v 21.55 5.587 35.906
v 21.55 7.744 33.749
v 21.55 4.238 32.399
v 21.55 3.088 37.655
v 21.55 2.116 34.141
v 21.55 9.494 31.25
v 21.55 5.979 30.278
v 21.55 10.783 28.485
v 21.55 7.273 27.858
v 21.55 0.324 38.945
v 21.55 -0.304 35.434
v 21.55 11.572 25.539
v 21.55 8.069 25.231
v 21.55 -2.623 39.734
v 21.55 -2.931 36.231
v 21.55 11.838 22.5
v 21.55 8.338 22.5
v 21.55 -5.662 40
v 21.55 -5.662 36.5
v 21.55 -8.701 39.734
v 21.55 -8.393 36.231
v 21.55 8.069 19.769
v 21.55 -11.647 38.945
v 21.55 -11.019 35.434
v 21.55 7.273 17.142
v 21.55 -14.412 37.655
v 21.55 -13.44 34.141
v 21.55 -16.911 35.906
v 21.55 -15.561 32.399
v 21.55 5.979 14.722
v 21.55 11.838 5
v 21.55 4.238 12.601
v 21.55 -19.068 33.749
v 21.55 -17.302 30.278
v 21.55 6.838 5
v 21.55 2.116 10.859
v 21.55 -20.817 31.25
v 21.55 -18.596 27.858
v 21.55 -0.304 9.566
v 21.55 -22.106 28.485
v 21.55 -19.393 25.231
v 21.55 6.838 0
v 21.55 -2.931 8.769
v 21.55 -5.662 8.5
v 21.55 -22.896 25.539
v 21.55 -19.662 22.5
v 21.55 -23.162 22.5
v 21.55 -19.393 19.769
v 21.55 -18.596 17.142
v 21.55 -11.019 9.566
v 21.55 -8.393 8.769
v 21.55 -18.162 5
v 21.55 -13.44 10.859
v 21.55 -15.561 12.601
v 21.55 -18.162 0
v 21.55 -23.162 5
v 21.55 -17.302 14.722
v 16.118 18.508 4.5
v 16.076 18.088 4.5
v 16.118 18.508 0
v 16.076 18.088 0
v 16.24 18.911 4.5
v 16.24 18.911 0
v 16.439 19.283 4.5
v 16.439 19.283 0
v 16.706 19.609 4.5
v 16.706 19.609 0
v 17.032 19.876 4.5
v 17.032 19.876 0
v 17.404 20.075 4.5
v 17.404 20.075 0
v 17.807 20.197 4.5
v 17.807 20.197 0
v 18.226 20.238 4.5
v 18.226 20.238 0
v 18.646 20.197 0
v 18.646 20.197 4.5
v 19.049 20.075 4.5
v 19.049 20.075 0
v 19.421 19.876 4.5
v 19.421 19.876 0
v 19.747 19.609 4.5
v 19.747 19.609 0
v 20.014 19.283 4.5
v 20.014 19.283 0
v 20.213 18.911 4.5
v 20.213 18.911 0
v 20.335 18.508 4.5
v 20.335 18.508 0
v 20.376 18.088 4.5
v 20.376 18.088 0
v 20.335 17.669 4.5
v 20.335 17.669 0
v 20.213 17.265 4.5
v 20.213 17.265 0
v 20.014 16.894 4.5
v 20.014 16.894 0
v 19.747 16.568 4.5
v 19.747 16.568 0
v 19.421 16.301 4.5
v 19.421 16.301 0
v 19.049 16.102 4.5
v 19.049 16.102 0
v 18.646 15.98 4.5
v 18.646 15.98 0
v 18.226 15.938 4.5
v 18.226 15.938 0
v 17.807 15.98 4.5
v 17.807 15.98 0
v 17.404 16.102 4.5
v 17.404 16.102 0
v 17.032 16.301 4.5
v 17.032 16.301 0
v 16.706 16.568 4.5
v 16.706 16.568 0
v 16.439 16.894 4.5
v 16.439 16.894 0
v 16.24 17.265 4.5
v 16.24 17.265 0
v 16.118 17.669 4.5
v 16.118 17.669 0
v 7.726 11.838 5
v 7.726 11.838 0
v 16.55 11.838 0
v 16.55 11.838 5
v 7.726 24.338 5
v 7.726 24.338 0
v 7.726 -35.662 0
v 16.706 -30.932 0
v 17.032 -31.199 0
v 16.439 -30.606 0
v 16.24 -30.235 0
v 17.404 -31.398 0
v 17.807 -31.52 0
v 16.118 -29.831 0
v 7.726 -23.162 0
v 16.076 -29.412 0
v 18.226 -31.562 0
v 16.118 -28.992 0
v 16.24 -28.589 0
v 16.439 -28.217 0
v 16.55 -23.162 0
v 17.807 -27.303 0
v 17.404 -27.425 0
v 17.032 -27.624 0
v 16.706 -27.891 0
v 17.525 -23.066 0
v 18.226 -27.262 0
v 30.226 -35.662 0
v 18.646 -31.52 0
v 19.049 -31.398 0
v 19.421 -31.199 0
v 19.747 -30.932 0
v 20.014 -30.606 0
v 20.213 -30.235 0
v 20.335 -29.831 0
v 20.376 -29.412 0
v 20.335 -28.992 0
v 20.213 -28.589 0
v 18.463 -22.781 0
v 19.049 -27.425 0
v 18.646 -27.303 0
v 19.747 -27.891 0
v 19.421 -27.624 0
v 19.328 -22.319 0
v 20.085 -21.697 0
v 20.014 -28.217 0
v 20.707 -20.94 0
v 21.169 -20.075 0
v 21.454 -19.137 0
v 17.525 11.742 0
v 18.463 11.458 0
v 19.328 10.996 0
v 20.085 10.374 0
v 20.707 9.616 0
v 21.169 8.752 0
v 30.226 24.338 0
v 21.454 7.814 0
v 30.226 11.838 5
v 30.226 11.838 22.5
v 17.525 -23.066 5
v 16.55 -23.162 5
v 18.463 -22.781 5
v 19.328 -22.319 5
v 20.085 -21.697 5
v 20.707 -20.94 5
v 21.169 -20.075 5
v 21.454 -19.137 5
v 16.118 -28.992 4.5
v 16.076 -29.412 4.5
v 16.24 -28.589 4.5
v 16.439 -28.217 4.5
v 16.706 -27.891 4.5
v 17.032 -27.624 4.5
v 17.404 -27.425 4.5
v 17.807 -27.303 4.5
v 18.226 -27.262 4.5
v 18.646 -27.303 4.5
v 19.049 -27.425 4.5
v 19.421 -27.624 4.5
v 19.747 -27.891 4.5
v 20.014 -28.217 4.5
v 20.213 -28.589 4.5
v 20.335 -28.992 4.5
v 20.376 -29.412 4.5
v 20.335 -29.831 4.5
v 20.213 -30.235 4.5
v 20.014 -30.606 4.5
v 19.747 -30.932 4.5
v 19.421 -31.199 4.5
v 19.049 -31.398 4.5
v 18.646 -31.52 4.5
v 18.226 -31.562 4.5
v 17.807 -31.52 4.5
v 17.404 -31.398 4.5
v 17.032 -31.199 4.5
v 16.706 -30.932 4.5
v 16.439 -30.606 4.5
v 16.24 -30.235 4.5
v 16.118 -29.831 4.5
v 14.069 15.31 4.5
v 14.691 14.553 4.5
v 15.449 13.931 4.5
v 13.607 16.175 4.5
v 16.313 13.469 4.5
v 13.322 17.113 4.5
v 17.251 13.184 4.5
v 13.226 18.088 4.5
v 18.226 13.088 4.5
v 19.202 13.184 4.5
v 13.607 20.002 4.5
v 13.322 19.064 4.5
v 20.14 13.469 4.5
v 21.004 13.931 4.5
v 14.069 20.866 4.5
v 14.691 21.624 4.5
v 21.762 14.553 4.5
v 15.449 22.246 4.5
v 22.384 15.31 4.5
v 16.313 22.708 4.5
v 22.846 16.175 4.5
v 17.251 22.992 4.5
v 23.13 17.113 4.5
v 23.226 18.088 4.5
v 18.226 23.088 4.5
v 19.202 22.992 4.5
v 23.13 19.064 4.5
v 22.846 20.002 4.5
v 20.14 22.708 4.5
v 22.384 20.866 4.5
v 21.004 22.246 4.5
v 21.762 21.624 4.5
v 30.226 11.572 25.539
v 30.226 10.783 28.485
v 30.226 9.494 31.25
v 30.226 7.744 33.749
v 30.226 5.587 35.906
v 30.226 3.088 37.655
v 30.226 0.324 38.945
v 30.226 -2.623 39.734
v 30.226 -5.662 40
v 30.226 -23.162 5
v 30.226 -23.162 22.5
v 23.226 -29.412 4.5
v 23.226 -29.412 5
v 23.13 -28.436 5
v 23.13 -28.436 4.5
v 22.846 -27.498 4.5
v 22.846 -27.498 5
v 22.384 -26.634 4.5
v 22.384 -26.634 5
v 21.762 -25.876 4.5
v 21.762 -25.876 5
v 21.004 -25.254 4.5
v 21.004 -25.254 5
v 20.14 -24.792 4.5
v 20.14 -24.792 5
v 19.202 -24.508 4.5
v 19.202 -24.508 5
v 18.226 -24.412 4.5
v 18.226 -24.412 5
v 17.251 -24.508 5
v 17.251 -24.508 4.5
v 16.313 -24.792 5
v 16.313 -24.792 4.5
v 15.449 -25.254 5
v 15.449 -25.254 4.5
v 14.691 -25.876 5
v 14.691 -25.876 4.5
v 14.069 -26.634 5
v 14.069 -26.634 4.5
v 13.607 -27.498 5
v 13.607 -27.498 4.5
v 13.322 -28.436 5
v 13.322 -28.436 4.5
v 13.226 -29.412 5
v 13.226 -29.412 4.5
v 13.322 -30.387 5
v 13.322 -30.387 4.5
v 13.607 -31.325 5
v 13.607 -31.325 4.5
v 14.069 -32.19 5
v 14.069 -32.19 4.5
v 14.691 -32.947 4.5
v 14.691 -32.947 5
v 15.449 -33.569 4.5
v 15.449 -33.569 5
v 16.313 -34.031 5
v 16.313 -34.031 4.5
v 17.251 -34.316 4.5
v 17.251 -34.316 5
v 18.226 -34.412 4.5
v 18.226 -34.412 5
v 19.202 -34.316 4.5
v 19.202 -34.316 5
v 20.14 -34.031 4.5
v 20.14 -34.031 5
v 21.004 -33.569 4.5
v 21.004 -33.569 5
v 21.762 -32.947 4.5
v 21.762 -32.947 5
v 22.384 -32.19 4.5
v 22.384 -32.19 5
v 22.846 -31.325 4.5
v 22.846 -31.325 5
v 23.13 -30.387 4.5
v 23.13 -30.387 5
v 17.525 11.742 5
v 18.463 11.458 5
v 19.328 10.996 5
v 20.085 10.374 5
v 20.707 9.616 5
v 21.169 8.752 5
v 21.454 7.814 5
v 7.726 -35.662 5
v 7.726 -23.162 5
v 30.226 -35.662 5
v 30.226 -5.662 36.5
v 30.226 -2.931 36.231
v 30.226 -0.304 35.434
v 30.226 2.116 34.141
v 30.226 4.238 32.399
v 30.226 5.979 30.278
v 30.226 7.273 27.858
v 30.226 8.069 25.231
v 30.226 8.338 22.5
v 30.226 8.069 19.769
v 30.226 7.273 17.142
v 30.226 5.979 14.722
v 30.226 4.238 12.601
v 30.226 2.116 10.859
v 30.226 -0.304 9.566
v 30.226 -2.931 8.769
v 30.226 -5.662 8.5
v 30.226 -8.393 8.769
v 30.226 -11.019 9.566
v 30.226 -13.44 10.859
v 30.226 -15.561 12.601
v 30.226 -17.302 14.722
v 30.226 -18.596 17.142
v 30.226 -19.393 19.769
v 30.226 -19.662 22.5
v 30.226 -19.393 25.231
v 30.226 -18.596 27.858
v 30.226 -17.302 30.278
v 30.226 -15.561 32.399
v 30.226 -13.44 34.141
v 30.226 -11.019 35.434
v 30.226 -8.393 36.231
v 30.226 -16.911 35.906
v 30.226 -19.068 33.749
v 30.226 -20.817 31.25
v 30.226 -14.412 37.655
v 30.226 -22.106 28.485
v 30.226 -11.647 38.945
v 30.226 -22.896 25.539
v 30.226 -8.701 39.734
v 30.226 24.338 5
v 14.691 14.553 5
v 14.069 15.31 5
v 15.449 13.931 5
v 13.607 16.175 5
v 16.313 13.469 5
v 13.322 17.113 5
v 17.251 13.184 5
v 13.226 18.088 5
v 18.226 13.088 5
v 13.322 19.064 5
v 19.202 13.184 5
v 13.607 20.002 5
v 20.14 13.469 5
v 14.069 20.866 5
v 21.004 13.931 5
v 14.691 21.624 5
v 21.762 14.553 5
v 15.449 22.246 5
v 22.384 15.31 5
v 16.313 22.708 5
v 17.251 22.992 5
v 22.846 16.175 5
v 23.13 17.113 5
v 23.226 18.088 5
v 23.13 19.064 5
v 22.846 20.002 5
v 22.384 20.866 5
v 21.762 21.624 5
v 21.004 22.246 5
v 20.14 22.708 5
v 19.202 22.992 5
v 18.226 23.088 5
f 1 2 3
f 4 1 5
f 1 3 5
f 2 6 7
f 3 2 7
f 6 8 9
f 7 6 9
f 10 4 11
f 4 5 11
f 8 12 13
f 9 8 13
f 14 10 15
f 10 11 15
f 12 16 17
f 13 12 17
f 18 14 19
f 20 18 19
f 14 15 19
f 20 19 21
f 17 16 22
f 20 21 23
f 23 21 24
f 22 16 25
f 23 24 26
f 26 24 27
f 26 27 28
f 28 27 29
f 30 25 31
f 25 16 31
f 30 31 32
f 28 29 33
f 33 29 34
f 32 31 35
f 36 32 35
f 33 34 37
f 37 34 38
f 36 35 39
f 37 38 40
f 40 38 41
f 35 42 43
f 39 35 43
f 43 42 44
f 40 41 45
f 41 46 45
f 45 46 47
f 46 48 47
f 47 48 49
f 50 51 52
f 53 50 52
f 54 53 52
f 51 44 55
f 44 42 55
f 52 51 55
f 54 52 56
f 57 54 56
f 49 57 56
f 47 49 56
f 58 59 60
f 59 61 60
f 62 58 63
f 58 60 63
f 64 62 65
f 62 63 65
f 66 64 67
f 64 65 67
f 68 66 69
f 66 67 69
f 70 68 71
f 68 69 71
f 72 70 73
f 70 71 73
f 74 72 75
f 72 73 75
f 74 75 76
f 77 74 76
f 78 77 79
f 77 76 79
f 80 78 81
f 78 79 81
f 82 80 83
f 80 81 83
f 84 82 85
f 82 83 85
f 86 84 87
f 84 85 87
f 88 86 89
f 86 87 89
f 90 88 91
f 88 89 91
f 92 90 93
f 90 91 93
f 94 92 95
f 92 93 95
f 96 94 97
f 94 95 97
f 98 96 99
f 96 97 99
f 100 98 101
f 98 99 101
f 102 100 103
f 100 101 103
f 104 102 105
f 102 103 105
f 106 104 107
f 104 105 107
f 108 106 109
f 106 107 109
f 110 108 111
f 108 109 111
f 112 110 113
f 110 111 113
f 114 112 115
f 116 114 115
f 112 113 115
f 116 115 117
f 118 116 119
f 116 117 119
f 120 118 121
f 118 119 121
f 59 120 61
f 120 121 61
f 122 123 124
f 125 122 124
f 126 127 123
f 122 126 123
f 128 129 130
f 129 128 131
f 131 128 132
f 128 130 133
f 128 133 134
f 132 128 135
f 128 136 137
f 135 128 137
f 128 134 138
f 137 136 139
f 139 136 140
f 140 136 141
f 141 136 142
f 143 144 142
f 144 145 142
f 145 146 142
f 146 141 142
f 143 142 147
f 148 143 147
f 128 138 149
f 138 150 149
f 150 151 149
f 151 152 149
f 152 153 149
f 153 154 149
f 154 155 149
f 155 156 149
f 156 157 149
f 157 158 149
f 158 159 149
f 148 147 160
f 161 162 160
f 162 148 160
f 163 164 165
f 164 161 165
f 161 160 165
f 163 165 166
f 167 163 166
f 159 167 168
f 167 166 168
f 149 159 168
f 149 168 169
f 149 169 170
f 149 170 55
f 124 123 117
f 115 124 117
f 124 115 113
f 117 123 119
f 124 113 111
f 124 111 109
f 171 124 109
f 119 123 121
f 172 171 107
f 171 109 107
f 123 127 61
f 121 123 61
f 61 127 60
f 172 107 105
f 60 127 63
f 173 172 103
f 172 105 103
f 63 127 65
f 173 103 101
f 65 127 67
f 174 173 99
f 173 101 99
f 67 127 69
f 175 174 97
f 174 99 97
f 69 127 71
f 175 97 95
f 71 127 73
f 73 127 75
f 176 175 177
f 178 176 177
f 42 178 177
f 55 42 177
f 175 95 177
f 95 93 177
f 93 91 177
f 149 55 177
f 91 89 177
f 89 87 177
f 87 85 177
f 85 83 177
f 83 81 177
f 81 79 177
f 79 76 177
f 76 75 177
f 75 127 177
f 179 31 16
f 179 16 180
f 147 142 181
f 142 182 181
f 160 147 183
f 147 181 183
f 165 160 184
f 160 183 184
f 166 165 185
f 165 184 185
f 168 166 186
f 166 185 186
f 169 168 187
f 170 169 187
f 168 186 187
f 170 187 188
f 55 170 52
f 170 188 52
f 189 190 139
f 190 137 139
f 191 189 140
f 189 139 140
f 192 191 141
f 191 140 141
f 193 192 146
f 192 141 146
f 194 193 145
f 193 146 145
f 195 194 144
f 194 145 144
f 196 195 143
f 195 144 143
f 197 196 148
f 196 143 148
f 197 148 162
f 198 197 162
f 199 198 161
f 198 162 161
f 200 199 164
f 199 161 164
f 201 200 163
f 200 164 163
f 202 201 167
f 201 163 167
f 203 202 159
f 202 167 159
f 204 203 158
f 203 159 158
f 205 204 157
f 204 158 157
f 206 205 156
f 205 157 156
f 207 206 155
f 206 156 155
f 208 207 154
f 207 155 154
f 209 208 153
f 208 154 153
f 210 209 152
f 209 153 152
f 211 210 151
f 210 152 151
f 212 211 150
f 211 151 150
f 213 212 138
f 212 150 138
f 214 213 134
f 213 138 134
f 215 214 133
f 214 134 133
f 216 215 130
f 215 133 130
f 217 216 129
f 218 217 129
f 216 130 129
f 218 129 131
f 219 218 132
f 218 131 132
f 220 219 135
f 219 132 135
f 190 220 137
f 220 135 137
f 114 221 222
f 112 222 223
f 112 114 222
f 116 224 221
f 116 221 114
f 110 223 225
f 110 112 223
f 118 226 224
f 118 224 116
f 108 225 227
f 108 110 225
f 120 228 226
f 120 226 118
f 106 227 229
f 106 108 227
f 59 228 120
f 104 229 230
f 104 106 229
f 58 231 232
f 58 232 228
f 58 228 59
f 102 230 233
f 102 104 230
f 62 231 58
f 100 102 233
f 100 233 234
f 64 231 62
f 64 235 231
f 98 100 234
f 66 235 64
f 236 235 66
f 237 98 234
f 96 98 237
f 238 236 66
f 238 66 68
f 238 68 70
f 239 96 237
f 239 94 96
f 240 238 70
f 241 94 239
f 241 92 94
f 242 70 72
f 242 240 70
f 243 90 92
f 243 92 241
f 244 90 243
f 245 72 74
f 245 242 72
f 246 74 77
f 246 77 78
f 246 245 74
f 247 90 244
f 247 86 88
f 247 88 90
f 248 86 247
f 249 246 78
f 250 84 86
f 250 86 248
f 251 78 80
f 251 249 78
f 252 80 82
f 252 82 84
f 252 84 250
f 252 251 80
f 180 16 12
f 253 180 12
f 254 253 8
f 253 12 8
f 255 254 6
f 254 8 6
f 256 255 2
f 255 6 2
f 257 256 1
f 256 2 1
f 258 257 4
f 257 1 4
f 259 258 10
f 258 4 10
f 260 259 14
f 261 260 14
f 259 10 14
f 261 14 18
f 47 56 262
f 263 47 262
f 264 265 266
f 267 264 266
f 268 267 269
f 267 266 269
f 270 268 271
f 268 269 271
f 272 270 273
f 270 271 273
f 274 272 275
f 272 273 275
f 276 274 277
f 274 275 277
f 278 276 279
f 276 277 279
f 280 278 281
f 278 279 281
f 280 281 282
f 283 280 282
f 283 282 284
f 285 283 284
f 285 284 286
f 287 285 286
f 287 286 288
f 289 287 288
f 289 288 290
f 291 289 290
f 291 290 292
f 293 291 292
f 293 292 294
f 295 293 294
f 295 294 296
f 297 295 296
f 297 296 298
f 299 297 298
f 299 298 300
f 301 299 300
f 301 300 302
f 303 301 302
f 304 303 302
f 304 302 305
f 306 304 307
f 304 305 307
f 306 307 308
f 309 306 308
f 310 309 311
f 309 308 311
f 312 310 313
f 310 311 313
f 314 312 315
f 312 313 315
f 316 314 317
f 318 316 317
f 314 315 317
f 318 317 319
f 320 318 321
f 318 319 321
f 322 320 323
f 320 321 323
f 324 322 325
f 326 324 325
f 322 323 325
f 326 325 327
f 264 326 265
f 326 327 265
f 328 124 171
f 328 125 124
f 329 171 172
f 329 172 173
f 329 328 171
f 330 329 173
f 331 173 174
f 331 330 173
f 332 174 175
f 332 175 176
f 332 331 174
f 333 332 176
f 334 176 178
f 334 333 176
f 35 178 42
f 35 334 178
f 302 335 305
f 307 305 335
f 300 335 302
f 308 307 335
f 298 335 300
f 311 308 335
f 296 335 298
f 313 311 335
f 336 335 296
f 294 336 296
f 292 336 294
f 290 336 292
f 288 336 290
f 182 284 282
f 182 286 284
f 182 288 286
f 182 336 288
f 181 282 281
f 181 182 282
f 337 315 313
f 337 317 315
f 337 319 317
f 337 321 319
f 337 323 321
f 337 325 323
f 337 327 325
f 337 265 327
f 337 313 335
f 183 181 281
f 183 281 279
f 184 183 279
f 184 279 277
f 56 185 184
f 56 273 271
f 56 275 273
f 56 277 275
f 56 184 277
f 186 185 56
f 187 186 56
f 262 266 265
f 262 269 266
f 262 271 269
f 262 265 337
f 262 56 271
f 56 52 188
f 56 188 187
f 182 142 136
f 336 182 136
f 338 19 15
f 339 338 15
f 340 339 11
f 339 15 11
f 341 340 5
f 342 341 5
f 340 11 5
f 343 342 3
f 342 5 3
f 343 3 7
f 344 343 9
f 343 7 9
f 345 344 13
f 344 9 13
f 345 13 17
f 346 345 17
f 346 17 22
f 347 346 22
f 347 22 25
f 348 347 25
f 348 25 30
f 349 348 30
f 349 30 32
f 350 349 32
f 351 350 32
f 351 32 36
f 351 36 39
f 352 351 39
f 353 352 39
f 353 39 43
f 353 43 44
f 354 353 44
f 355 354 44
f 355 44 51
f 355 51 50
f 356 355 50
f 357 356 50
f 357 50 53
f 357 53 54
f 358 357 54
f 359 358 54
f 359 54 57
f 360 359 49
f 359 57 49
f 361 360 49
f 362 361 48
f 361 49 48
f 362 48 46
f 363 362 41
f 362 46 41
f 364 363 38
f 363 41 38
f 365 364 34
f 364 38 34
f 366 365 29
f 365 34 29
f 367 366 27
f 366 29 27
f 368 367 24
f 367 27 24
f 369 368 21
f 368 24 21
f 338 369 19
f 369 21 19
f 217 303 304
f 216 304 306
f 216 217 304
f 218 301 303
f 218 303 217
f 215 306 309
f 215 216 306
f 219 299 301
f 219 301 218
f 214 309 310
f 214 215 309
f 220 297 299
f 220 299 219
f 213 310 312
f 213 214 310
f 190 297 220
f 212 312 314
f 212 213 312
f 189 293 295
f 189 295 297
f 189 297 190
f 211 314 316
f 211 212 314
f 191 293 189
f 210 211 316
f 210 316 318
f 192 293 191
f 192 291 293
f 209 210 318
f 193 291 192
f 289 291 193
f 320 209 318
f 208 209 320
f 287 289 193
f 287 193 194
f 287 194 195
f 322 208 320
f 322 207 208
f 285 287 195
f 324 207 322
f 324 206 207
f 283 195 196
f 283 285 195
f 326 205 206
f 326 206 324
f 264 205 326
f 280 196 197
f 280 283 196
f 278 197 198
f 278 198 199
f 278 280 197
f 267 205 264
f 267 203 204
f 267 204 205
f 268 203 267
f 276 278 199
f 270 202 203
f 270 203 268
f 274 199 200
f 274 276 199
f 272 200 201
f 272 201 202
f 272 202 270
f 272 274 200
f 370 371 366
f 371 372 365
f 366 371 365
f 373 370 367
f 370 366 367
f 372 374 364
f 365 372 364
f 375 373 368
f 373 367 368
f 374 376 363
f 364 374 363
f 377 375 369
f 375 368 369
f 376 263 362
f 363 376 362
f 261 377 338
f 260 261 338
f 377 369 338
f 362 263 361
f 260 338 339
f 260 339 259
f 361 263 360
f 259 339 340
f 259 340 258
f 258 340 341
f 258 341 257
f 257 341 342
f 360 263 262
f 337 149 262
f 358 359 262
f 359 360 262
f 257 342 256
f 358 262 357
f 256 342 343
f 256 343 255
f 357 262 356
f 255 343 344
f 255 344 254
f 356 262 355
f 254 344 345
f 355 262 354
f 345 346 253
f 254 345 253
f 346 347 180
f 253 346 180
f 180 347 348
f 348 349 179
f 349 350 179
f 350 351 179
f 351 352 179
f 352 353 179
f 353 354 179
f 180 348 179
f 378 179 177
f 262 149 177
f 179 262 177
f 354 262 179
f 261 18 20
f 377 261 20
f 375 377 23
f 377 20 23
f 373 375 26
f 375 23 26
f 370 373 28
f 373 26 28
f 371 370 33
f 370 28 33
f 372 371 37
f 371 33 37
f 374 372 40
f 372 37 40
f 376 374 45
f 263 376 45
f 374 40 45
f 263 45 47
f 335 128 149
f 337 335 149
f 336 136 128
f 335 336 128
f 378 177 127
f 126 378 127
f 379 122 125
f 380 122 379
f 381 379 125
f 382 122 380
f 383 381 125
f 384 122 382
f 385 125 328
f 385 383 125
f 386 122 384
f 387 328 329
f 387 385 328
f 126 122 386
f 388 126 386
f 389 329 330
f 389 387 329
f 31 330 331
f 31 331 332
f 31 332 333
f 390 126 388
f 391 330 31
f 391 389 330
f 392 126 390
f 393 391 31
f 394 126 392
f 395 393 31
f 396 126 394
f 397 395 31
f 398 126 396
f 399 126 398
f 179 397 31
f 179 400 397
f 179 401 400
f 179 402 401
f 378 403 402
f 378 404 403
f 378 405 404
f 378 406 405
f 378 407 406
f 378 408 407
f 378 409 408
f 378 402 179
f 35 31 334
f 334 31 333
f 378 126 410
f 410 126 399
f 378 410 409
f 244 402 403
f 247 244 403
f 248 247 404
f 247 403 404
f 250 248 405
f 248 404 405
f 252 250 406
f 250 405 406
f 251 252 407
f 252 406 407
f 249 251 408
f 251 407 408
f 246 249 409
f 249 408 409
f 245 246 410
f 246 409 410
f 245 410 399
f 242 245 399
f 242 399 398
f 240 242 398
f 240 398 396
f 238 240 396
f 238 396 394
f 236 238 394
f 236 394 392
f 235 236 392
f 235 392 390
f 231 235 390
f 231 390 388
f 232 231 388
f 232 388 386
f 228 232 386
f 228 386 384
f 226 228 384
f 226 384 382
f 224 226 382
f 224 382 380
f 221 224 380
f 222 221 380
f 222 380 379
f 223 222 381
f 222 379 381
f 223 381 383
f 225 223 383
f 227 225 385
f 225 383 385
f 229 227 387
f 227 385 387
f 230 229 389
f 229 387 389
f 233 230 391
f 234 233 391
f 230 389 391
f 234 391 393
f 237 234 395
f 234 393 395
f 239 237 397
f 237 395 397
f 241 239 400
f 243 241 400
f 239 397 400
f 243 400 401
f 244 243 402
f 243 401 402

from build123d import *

# Parameters (mm, degrees)
EXTRUDE_2_DEPTH                = 5
SKETCH_4_W                     = 8.676470589
SKETCH_4_H                     = 35
SKETCH_4_W_2                   = 8.676470588
EXTRUDE_15_DEPTH               = 35
CUT_EXTRUDE_1_DEPTH            = 45
SKETCH_6_R                     = 14
CUT_EXTRUDE_2_DEPTH            = 45
FILLET_1_R                     = 5
SKETCH_7_R                     = 15
SKETCH_7_R_2                   = 13
EXTRUDE_16_DEPTH               = 1
SPLIT_BODIES_1_SURFACE_1_BACK  = 86
SPLIT_BODIES_1_SURFACE_1_DEPTH = 172
SPLIT_BODIES_1_SURFACE_2_BACK  = 86
SPLIT_BODIES_1_SURFACE_2_DEPTH = 172
HOLE_WIZARD_1_D                = 4.3
HOLE_WIZARD_1_DEPTH            = 5
HOLE_WIZARD_1_CBORE_D          = 10
HOLE_WIZARD_1_CBORE_DEPTH      = 0.5
HOLE_WIZARD_1_TIP              = 1.291850331


with BuildPart() as part:
    # 草图2 → 凸台-拉伸2 (new body)
    with BuildSketch(Plane.XY):
        Polygon((7.726423565, 24.338235294), (-14.773576435, 24.338235294), (-14.773576435, -35.661764706), (7.726423565, -35.661764706), (7.726423565, -23.161764706), (-6.097105846, -23.161764706), (-6.097105846, 11.838235294), (7.726423565, 11.838235294), align=None)
        Polygon((30.226423565, 24.338235294), (7.726423565, 24.338235294), (7.726423565, 11.838235294), (21.549952977, 11.838235294), (21.549952977, -23.161764706), (7.726423565, -23.161764706), (7.726423565, -35.661764706), (30.226423565, -35.661764706), align=None)
    extrude(amount=EXTRUDE_2_DEPTH)

    # 草图4 → 凸台-拉伸15 (add)
    with BuildSketch(Plane.XY.offset(5)):
        with Locations((-10.435341141, -5.661764706)):
            Rectangle(SKETCH_4_W, SKETCH_4_H)
        with Locations((25.888188271, -5.661764706)):
            Rectangle(SKETCH_4_W_2, SKETCH_4_H)
    extrude(amount=EXTRUDE_15_DEPTH)

    # 草图5 → 切除-拉伸1 (cut)
    with BuildSketch(Plane.ZY.offset(14.773576435)):
        with BuildLine():
            Line((40, -23.161764706), (40, -5.661764706))
            ThreePointArc((40, -5.661764706), (34.874368671, -18.036133377), (22.5, -23.161764706))
            Line((22.5, -23.161764706), (40, -23.161764706))
        make_face()
        with BuildLine():
            ThreePointArc((22.5, 11.838235294), (34.874368671, 6.712603965), (40, -5.661764706))
            Line((40, -5.661764706), (40, 11.838235294))
            Line((40, 11.838235294), (22.5, 11.838235294))
        make_face()
    extrude(amount=-CUT_EXTRUDE_1_DEPTH, mode=Mode.SUBTRACT)

    # 草图6 → 切除-拉伸2 (cut)
    with BuildSketch(Plane.ZY.offset(14.773576435)):
        with Locations((22.5, -5.661764706)):
            Circle(SKETCH_6_R)
    extrude(amount=-CUT_EXTRUDE_2_DEPTH, mode=Mode.SUBTRACT)

    # 圆角1
    fillet_1_edges = [part.edges().sort_by_distance(p)[0] for p in [
        (-6.097105846, 11.838235294, 2.5),
        (-6.097105846, -23.161764706, 2.5),
        (21.549952977, -23.161764706, 2.5),
        (21.549952977, 11.838235294, 2.5),
    ]]
    fillet(fillet_1_edges, radius=FILLET_1_R)

    # 草图7 → 凸台-拉伸16 (add)
    with BuildSketch(Plane(origin=(-6.097105846, 0, 0), x_dir=(0, 0, -1), z_dir=(1, 0, 0))):
        with Locations((-22.5, -5.661764706)):
            Circle(SKETCH_7_R)
        with Locations((-22.5, -5.661764706)):
            Circle(SKETCH_7_R_2, mode=Mode.SUBTRACT)
    extrude(amount=-EXTRUDE_16_DEPTH)


with BuildPart() as body_2:
    # Split Bodies 1: the piece behind the surface
    add(part.part)
    # Split Bodies 1 surface: a surface, the sketch's curves swept straight by 172 mm
    with BuildLine(Plane.XY.offset(5).offset(-SPLIT_BODIES_1_SURFACE_1_BACK), mode=Mode.PRIVATE) as split_bodies_1_surface_1_path:
        Line((7.726423565, 24.338235294), (7.726423565, -35.661764706))
    split_bodies_1_surface_1 = Shell.extrude(split_bodies_1_surface_1_path.wire(), (0 * SPLIT_BODIES_1_SURFACE_1_DEPTH, 0 * SPLIT_BODIES_1_SURFACE_1_DEPTH, 1 * SPLIT_BODIES_1_SURFACE_1_DEPTH))
    split(bisect_by=split_bodies_1_surface_1, keep=Keep.BOTTOM)


with BuildPart() as part_1:
    add(part.part)

    # Split Bodies 1: split by a surface, the side it looks to stays
    # Split Bodies 1 surface: a surface, the sketch's curves swept straight by 172 mm
    with BuildLine(Plane.XY.offset(5).offset(-SPLIT_BODIES_1_SURFACE_2_BACK), mode=Mode.PRIVATE) as split_bodies_1_surface_2_path:
        Line((7.726423565, 24.338235294), (7.726423565, -35.661764706))
    split_bodies_1_surface_2 = Shell.extrude(split_bodies_1_surface_2_path.wire(), (0 * SPLIT_BODIES_1_SURFACE_2_DEPTH, 0 * SPLIT_BODIES_1_SURFACE_2_DEPTH, 1 * SPLIT_BODIES_1_SURFACE_2_DEPTH))
    split(bisect_by=split_bodies_1_surface_2, keep=Keep.TOP)

    # 打孔尺寸(%根据六角头螺)栓 全螺纹的类型1
    with Locations(Plane(origin=(18.226423565, 18.088235294, 5), x_dir=(1, 0, 0), z_dir=(0, 0, 1))):
        with Locations((0, 0), (0, -47.5)):
            CounterBoreHole(HOLE_WIZARD_1_D / 2, HOLE_WIZARD_1_CBORE_D / 2, HOLE_WIZARD_1_CBORE_DEPTH, depth=HOLE_WIZARD_1_DEPTH)
            with Locations((0, 0, -(HOLE_WIZARD_1_DEPTH + HOLE_WIZARD_1_TIP / 2))):  # 118° drill point
                Cone(0, HOLE_WIZARD_1_D / 2, HOLE_WIZARD_1_TIP, mode=Mode.SUBTRACT)


solid = part_1.part
